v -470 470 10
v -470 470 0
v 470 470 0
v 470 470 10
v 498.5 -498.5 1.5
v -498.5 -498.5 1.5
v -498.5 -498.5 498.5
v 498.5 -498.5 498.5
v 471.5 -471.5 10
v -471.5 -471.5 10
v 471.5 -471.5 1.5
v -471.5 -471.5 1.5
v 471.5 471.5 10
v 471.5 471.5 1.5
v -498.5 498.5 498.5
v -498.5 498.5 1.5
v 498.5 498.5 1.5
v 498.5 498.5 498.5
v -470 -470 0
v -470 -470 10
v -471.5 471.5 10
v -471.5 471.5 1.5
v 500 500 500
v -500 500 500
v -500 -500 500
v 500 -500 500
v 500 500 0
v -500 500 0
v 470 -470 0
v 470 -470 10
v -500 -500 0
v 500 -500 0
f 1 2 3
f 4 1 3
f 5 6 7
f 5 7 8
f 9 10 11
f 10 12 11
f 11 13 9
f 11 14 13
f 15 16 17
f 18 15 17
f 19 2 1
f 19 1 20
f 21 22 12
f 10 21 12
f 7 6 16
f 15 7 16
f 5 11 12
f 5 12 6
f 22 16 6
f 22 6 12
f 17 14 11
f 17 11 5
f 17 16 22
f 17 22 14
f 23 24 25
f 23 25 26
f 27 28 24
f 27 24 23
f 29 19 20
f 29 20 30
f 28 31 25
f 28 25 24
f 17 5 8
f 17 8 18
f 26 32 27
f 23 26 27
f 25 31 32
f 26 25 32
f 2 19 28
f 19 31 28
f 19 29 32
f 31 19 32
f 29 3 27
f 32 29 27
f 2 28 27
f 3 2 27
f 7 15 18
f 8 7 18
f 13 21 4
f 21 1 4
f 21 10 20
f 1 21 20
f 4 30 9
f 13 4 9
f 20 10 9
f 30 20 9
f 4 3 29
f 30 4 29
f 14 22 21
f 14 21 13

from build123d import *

# Parameters (mm, degrees)
F0_W     = 1000
F0_H     = 1000
F1_DEPTH = 500
F2_W     = 940
F2_H     = 940
F3_DEPTH = 10
F4_T     = -1.5


# Not quite as in the source:
# - a shell that OpenCascade refuses in one call is made with other operations: the cavity is built on its own and cut out


with BuildPart() as f1:
    # F0 (on Top) → F1 (new body)
    with BuildSketch(Plane.XY):
        Rectangle(F0_W, F0_H)
    extrude(amount=F1_DEPTH)

    # F2 (on face) → F3 (cut)
    with BuildSketch(Plane(origin=(0, 0, 0), x_dir=(1, 0, 0), z_dir=(0, 0, -1))):
        Rectangle(F2_W, F2_H)
    extrude(amount=-F3_DEPTH, mode=Mode.SUBTRACT)

    # F4: a shell. OpenCascade refuses it in one call, so the cavity is built on its own and cut out:
    # the body offset inwards by the wall thickness, plus a prism from it out through each open face.
    f4_core = offset(f1.part, amount=F4_T, kind=Kind.INTERSECTION, mode=Mode.PRIVATE)
    f4_exits = [f4_core.faces().sort_by_distance(p)[0] for p in [
        (0, 0, 11.5),
    ]]
    add(f4_core, mode=Mode.SUBTRACT)
    extrude(f4_exits, amount=-F4_T, mode=Mode.SUBTRACT)


solid = f1.part
